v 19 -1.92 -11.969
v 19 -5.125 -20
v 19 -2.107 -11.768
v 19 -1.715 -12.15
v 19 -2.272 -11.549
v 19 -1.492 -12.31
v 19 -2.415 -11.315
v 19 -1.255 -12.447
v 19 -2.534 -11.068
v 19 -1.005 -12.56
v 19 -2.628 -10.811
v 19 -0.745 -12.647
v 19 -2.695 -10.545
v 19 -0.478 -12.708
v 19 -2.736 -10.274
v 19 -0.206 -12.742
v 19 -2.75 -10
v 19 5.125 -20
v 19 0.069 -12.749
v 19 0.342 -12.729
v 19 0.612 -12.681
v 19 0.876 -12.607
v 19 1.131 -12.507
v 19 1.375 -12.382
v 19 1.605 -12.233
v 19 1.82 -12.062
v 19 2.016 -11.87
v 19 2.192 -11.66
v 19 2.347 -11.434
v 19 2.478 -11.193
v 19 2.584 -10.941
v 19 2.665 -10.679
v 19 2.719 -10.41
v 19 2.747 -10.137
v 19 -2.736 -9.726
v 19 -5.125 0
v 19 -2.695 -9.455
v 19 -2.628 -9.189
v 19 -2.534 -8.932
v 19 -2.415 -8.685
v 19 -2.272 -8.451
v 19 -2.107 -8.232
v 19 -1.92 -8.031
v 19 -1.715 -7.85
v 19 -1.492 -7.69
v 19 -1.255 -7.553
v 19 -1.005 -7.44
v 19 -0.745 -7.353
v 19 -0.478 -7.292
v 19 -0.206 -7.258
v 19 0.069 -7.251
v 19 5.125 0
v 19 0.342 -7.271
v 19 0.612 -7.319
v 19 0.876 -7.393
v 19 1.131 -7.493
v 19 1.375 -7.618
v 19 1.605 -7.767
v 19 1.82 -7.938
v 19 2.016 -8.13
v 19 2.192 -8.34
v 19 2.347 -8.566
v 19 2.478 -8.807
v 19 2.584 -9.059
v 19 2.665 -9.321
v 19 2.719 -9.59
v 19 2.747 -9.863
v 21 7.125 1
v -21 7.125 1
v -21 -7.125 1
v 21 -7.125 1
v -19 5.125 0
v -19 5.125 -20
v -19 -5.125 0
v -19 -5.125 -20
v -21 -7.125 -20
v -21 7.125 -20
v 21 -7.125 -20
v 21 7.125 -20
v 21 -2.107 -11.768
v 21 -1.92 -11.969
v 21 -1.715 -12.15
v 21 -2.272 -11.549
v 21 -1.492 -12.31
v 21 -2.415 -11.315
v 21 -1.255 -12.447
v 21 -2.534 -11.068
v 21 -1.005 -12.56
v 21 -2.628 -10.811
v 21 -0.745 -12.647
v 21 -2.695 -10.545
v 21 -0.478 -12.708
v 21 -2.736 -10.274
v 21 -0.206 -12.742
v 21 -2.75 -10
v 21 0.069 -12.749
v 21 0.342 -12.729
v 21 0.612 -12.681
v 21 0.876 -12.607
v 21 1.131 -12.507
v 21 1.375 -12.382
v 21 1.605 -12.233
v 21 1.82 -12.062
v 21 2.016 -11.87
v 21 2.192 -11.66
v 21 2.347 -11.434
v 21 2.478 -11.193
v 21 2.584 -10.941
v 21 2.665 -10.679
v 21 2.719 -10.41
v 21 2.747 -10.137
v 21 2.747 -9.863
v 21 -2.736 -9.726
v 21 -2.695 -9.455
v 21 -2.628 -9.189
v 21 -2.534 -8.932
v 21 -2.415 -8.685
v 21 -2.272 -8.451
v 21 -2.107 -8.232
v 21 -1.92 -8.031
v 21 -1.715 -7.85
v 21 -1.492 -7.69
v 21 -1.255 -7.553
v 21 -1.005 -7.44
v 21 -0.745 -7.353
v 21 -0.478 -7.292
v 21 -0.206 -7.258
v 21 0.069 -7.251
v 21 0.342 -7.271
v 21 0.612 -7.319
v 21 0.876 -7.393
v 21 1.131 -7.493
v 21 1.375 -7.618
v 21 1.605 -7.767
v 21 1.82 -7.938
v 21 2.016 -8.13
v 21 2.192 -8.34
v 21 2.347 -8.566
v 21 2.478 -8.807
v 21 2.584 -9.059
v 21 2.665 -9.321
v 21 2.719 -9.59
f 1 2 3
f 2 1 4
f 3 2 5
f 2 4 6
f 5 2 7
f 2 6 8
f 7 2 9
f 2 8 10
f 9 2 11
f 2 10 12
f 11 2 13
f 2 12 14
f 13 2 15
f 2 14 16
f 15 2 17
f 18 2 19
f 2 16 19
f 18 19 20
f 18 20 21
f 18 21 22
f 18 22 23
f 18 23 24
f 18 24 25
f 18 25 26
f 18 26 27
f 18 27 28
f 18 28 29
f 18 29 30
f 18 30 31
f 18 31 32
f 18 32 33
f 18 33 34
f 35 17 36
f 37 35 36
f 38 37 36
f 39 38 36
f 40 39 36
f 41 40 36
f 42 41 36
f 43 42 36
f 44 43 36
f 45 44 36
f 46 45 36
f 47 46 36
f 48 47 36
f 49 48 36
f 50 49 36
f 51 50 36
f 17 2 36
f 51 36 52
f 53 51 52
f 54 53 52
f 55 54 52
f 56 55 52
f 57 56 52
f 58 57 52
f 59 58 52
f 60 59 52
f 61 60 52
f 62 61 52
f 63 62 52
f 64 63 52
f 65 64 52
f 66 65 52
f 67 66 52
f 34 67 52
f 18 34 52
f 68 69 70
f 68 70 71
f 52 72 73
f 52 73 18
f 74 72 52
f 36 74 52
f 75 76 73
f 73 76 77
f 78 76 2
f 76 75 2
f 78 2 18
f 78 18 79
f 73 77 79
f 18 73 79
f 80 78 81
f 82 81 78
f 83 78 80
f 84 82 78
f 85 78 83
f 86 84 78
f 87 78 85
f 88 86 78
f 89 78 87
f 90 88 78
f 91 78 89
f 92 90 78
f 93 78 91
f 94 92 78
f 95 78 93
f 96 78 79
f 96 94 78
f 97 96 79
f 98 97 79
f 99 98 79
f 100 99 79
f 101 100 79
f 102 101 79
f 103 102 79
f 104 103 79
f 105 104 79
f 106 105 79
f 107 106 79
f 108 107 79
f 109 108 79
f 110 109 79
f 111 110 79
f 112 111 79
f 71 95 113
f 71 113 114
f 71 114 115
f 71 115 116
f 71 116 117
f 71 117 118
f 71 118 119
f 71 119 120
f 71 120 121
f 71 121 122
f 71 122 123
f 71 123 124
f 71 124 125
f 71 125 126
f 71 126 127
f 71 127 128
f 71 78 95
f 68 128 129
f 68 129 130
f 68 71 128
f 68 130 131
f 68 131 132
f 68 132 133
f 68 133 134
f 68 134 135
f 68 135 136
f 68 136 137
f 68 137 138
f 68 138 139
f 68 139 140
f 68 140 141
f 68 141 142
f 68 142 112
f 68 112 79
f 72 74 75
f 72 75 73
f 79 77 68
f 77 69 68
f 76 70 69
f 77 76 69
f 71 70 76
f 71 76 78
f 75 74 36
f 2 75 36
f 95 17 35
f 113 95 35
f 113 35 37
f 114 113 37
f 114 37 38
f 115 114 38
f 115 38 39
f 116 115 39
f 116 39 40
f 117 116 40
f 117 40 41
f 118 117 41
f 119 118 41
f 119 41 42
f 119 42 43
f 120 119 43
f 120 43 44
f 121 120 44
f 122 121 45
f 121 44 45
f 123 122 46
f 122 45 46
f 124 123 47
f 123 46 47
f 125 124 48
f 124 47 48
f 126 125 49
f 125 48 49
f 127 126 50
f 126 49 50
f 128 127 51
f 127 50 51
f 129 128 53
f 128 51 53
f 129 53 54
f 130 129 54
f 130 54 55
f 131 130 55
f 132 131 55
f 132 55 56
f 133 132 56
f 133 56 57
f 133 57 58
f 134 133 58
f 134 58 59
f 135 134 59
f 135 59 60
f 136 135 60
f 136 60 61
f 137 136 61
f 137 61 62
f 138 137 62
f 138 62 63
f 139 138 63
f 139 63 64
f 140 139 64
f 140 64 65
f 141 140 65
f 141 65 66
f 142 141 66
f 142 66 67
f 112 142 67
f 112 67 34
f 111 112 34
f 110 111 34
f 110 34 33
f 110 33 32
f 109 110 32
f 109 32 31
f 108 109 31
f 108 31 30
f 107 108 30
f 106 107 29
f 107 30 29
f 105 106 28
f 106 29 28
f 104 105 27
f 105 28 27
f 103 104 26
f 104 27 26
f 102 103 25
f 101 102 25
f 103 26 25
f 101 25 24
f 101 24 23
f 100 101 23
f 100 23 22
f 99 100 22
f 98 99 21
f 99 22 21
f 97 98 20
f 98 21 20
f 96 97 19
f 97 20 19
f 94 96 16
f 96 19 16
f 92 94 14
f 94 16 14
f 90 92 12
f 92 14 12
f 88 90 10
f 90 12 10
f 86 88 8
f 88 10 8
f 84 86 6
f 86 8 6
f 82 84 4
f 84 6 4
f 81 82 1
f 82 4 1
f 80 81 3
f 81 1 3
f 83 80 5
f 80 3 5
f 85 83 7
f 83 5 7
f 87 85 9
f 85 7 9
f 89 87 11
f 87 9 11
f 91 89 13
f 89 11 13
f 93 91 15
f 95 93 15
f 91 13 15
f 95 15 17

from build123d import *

# Parameters (mm, degrees)
F0_W     = 42
F0_H     = 14.25
F0_W_2   = 38
F0_H_2   = 10.25
F1_DEPTH = 1
F2_DEPTH = 20
F4_D     = 5.5
F4_DEPTH = 14.4


with BuildPart() as f1:
    # F0 (on Top) → F1 (new body)
    with BuildSketch(Plane.XY):
        Rectangle(F0_W, F0_H)
        Rectangle(F0_W_2, F0_H_2, mode=Mode.SUBTRACT)
        Rectangle(F0_W_2, F0_H_2)
    extrude(amount=F1_DEPTH)

    # F0 (on Top) → F2 (join)
    with BuildSketch(Plane.XY):
        Rectangle(F0_W, F0_H)
        Rectangle(F0_W_2, F0_H_2, mode=Mode.SUBTRACT)
    extrude(amount=-F2_DEPTH)

    # F4
    with Locations(Plane.YZ.offset(21)):
        with Locations((0, -10)):
            Hole(F4_D / 2, depth=F4_DEPTH)


solid = f1.part
